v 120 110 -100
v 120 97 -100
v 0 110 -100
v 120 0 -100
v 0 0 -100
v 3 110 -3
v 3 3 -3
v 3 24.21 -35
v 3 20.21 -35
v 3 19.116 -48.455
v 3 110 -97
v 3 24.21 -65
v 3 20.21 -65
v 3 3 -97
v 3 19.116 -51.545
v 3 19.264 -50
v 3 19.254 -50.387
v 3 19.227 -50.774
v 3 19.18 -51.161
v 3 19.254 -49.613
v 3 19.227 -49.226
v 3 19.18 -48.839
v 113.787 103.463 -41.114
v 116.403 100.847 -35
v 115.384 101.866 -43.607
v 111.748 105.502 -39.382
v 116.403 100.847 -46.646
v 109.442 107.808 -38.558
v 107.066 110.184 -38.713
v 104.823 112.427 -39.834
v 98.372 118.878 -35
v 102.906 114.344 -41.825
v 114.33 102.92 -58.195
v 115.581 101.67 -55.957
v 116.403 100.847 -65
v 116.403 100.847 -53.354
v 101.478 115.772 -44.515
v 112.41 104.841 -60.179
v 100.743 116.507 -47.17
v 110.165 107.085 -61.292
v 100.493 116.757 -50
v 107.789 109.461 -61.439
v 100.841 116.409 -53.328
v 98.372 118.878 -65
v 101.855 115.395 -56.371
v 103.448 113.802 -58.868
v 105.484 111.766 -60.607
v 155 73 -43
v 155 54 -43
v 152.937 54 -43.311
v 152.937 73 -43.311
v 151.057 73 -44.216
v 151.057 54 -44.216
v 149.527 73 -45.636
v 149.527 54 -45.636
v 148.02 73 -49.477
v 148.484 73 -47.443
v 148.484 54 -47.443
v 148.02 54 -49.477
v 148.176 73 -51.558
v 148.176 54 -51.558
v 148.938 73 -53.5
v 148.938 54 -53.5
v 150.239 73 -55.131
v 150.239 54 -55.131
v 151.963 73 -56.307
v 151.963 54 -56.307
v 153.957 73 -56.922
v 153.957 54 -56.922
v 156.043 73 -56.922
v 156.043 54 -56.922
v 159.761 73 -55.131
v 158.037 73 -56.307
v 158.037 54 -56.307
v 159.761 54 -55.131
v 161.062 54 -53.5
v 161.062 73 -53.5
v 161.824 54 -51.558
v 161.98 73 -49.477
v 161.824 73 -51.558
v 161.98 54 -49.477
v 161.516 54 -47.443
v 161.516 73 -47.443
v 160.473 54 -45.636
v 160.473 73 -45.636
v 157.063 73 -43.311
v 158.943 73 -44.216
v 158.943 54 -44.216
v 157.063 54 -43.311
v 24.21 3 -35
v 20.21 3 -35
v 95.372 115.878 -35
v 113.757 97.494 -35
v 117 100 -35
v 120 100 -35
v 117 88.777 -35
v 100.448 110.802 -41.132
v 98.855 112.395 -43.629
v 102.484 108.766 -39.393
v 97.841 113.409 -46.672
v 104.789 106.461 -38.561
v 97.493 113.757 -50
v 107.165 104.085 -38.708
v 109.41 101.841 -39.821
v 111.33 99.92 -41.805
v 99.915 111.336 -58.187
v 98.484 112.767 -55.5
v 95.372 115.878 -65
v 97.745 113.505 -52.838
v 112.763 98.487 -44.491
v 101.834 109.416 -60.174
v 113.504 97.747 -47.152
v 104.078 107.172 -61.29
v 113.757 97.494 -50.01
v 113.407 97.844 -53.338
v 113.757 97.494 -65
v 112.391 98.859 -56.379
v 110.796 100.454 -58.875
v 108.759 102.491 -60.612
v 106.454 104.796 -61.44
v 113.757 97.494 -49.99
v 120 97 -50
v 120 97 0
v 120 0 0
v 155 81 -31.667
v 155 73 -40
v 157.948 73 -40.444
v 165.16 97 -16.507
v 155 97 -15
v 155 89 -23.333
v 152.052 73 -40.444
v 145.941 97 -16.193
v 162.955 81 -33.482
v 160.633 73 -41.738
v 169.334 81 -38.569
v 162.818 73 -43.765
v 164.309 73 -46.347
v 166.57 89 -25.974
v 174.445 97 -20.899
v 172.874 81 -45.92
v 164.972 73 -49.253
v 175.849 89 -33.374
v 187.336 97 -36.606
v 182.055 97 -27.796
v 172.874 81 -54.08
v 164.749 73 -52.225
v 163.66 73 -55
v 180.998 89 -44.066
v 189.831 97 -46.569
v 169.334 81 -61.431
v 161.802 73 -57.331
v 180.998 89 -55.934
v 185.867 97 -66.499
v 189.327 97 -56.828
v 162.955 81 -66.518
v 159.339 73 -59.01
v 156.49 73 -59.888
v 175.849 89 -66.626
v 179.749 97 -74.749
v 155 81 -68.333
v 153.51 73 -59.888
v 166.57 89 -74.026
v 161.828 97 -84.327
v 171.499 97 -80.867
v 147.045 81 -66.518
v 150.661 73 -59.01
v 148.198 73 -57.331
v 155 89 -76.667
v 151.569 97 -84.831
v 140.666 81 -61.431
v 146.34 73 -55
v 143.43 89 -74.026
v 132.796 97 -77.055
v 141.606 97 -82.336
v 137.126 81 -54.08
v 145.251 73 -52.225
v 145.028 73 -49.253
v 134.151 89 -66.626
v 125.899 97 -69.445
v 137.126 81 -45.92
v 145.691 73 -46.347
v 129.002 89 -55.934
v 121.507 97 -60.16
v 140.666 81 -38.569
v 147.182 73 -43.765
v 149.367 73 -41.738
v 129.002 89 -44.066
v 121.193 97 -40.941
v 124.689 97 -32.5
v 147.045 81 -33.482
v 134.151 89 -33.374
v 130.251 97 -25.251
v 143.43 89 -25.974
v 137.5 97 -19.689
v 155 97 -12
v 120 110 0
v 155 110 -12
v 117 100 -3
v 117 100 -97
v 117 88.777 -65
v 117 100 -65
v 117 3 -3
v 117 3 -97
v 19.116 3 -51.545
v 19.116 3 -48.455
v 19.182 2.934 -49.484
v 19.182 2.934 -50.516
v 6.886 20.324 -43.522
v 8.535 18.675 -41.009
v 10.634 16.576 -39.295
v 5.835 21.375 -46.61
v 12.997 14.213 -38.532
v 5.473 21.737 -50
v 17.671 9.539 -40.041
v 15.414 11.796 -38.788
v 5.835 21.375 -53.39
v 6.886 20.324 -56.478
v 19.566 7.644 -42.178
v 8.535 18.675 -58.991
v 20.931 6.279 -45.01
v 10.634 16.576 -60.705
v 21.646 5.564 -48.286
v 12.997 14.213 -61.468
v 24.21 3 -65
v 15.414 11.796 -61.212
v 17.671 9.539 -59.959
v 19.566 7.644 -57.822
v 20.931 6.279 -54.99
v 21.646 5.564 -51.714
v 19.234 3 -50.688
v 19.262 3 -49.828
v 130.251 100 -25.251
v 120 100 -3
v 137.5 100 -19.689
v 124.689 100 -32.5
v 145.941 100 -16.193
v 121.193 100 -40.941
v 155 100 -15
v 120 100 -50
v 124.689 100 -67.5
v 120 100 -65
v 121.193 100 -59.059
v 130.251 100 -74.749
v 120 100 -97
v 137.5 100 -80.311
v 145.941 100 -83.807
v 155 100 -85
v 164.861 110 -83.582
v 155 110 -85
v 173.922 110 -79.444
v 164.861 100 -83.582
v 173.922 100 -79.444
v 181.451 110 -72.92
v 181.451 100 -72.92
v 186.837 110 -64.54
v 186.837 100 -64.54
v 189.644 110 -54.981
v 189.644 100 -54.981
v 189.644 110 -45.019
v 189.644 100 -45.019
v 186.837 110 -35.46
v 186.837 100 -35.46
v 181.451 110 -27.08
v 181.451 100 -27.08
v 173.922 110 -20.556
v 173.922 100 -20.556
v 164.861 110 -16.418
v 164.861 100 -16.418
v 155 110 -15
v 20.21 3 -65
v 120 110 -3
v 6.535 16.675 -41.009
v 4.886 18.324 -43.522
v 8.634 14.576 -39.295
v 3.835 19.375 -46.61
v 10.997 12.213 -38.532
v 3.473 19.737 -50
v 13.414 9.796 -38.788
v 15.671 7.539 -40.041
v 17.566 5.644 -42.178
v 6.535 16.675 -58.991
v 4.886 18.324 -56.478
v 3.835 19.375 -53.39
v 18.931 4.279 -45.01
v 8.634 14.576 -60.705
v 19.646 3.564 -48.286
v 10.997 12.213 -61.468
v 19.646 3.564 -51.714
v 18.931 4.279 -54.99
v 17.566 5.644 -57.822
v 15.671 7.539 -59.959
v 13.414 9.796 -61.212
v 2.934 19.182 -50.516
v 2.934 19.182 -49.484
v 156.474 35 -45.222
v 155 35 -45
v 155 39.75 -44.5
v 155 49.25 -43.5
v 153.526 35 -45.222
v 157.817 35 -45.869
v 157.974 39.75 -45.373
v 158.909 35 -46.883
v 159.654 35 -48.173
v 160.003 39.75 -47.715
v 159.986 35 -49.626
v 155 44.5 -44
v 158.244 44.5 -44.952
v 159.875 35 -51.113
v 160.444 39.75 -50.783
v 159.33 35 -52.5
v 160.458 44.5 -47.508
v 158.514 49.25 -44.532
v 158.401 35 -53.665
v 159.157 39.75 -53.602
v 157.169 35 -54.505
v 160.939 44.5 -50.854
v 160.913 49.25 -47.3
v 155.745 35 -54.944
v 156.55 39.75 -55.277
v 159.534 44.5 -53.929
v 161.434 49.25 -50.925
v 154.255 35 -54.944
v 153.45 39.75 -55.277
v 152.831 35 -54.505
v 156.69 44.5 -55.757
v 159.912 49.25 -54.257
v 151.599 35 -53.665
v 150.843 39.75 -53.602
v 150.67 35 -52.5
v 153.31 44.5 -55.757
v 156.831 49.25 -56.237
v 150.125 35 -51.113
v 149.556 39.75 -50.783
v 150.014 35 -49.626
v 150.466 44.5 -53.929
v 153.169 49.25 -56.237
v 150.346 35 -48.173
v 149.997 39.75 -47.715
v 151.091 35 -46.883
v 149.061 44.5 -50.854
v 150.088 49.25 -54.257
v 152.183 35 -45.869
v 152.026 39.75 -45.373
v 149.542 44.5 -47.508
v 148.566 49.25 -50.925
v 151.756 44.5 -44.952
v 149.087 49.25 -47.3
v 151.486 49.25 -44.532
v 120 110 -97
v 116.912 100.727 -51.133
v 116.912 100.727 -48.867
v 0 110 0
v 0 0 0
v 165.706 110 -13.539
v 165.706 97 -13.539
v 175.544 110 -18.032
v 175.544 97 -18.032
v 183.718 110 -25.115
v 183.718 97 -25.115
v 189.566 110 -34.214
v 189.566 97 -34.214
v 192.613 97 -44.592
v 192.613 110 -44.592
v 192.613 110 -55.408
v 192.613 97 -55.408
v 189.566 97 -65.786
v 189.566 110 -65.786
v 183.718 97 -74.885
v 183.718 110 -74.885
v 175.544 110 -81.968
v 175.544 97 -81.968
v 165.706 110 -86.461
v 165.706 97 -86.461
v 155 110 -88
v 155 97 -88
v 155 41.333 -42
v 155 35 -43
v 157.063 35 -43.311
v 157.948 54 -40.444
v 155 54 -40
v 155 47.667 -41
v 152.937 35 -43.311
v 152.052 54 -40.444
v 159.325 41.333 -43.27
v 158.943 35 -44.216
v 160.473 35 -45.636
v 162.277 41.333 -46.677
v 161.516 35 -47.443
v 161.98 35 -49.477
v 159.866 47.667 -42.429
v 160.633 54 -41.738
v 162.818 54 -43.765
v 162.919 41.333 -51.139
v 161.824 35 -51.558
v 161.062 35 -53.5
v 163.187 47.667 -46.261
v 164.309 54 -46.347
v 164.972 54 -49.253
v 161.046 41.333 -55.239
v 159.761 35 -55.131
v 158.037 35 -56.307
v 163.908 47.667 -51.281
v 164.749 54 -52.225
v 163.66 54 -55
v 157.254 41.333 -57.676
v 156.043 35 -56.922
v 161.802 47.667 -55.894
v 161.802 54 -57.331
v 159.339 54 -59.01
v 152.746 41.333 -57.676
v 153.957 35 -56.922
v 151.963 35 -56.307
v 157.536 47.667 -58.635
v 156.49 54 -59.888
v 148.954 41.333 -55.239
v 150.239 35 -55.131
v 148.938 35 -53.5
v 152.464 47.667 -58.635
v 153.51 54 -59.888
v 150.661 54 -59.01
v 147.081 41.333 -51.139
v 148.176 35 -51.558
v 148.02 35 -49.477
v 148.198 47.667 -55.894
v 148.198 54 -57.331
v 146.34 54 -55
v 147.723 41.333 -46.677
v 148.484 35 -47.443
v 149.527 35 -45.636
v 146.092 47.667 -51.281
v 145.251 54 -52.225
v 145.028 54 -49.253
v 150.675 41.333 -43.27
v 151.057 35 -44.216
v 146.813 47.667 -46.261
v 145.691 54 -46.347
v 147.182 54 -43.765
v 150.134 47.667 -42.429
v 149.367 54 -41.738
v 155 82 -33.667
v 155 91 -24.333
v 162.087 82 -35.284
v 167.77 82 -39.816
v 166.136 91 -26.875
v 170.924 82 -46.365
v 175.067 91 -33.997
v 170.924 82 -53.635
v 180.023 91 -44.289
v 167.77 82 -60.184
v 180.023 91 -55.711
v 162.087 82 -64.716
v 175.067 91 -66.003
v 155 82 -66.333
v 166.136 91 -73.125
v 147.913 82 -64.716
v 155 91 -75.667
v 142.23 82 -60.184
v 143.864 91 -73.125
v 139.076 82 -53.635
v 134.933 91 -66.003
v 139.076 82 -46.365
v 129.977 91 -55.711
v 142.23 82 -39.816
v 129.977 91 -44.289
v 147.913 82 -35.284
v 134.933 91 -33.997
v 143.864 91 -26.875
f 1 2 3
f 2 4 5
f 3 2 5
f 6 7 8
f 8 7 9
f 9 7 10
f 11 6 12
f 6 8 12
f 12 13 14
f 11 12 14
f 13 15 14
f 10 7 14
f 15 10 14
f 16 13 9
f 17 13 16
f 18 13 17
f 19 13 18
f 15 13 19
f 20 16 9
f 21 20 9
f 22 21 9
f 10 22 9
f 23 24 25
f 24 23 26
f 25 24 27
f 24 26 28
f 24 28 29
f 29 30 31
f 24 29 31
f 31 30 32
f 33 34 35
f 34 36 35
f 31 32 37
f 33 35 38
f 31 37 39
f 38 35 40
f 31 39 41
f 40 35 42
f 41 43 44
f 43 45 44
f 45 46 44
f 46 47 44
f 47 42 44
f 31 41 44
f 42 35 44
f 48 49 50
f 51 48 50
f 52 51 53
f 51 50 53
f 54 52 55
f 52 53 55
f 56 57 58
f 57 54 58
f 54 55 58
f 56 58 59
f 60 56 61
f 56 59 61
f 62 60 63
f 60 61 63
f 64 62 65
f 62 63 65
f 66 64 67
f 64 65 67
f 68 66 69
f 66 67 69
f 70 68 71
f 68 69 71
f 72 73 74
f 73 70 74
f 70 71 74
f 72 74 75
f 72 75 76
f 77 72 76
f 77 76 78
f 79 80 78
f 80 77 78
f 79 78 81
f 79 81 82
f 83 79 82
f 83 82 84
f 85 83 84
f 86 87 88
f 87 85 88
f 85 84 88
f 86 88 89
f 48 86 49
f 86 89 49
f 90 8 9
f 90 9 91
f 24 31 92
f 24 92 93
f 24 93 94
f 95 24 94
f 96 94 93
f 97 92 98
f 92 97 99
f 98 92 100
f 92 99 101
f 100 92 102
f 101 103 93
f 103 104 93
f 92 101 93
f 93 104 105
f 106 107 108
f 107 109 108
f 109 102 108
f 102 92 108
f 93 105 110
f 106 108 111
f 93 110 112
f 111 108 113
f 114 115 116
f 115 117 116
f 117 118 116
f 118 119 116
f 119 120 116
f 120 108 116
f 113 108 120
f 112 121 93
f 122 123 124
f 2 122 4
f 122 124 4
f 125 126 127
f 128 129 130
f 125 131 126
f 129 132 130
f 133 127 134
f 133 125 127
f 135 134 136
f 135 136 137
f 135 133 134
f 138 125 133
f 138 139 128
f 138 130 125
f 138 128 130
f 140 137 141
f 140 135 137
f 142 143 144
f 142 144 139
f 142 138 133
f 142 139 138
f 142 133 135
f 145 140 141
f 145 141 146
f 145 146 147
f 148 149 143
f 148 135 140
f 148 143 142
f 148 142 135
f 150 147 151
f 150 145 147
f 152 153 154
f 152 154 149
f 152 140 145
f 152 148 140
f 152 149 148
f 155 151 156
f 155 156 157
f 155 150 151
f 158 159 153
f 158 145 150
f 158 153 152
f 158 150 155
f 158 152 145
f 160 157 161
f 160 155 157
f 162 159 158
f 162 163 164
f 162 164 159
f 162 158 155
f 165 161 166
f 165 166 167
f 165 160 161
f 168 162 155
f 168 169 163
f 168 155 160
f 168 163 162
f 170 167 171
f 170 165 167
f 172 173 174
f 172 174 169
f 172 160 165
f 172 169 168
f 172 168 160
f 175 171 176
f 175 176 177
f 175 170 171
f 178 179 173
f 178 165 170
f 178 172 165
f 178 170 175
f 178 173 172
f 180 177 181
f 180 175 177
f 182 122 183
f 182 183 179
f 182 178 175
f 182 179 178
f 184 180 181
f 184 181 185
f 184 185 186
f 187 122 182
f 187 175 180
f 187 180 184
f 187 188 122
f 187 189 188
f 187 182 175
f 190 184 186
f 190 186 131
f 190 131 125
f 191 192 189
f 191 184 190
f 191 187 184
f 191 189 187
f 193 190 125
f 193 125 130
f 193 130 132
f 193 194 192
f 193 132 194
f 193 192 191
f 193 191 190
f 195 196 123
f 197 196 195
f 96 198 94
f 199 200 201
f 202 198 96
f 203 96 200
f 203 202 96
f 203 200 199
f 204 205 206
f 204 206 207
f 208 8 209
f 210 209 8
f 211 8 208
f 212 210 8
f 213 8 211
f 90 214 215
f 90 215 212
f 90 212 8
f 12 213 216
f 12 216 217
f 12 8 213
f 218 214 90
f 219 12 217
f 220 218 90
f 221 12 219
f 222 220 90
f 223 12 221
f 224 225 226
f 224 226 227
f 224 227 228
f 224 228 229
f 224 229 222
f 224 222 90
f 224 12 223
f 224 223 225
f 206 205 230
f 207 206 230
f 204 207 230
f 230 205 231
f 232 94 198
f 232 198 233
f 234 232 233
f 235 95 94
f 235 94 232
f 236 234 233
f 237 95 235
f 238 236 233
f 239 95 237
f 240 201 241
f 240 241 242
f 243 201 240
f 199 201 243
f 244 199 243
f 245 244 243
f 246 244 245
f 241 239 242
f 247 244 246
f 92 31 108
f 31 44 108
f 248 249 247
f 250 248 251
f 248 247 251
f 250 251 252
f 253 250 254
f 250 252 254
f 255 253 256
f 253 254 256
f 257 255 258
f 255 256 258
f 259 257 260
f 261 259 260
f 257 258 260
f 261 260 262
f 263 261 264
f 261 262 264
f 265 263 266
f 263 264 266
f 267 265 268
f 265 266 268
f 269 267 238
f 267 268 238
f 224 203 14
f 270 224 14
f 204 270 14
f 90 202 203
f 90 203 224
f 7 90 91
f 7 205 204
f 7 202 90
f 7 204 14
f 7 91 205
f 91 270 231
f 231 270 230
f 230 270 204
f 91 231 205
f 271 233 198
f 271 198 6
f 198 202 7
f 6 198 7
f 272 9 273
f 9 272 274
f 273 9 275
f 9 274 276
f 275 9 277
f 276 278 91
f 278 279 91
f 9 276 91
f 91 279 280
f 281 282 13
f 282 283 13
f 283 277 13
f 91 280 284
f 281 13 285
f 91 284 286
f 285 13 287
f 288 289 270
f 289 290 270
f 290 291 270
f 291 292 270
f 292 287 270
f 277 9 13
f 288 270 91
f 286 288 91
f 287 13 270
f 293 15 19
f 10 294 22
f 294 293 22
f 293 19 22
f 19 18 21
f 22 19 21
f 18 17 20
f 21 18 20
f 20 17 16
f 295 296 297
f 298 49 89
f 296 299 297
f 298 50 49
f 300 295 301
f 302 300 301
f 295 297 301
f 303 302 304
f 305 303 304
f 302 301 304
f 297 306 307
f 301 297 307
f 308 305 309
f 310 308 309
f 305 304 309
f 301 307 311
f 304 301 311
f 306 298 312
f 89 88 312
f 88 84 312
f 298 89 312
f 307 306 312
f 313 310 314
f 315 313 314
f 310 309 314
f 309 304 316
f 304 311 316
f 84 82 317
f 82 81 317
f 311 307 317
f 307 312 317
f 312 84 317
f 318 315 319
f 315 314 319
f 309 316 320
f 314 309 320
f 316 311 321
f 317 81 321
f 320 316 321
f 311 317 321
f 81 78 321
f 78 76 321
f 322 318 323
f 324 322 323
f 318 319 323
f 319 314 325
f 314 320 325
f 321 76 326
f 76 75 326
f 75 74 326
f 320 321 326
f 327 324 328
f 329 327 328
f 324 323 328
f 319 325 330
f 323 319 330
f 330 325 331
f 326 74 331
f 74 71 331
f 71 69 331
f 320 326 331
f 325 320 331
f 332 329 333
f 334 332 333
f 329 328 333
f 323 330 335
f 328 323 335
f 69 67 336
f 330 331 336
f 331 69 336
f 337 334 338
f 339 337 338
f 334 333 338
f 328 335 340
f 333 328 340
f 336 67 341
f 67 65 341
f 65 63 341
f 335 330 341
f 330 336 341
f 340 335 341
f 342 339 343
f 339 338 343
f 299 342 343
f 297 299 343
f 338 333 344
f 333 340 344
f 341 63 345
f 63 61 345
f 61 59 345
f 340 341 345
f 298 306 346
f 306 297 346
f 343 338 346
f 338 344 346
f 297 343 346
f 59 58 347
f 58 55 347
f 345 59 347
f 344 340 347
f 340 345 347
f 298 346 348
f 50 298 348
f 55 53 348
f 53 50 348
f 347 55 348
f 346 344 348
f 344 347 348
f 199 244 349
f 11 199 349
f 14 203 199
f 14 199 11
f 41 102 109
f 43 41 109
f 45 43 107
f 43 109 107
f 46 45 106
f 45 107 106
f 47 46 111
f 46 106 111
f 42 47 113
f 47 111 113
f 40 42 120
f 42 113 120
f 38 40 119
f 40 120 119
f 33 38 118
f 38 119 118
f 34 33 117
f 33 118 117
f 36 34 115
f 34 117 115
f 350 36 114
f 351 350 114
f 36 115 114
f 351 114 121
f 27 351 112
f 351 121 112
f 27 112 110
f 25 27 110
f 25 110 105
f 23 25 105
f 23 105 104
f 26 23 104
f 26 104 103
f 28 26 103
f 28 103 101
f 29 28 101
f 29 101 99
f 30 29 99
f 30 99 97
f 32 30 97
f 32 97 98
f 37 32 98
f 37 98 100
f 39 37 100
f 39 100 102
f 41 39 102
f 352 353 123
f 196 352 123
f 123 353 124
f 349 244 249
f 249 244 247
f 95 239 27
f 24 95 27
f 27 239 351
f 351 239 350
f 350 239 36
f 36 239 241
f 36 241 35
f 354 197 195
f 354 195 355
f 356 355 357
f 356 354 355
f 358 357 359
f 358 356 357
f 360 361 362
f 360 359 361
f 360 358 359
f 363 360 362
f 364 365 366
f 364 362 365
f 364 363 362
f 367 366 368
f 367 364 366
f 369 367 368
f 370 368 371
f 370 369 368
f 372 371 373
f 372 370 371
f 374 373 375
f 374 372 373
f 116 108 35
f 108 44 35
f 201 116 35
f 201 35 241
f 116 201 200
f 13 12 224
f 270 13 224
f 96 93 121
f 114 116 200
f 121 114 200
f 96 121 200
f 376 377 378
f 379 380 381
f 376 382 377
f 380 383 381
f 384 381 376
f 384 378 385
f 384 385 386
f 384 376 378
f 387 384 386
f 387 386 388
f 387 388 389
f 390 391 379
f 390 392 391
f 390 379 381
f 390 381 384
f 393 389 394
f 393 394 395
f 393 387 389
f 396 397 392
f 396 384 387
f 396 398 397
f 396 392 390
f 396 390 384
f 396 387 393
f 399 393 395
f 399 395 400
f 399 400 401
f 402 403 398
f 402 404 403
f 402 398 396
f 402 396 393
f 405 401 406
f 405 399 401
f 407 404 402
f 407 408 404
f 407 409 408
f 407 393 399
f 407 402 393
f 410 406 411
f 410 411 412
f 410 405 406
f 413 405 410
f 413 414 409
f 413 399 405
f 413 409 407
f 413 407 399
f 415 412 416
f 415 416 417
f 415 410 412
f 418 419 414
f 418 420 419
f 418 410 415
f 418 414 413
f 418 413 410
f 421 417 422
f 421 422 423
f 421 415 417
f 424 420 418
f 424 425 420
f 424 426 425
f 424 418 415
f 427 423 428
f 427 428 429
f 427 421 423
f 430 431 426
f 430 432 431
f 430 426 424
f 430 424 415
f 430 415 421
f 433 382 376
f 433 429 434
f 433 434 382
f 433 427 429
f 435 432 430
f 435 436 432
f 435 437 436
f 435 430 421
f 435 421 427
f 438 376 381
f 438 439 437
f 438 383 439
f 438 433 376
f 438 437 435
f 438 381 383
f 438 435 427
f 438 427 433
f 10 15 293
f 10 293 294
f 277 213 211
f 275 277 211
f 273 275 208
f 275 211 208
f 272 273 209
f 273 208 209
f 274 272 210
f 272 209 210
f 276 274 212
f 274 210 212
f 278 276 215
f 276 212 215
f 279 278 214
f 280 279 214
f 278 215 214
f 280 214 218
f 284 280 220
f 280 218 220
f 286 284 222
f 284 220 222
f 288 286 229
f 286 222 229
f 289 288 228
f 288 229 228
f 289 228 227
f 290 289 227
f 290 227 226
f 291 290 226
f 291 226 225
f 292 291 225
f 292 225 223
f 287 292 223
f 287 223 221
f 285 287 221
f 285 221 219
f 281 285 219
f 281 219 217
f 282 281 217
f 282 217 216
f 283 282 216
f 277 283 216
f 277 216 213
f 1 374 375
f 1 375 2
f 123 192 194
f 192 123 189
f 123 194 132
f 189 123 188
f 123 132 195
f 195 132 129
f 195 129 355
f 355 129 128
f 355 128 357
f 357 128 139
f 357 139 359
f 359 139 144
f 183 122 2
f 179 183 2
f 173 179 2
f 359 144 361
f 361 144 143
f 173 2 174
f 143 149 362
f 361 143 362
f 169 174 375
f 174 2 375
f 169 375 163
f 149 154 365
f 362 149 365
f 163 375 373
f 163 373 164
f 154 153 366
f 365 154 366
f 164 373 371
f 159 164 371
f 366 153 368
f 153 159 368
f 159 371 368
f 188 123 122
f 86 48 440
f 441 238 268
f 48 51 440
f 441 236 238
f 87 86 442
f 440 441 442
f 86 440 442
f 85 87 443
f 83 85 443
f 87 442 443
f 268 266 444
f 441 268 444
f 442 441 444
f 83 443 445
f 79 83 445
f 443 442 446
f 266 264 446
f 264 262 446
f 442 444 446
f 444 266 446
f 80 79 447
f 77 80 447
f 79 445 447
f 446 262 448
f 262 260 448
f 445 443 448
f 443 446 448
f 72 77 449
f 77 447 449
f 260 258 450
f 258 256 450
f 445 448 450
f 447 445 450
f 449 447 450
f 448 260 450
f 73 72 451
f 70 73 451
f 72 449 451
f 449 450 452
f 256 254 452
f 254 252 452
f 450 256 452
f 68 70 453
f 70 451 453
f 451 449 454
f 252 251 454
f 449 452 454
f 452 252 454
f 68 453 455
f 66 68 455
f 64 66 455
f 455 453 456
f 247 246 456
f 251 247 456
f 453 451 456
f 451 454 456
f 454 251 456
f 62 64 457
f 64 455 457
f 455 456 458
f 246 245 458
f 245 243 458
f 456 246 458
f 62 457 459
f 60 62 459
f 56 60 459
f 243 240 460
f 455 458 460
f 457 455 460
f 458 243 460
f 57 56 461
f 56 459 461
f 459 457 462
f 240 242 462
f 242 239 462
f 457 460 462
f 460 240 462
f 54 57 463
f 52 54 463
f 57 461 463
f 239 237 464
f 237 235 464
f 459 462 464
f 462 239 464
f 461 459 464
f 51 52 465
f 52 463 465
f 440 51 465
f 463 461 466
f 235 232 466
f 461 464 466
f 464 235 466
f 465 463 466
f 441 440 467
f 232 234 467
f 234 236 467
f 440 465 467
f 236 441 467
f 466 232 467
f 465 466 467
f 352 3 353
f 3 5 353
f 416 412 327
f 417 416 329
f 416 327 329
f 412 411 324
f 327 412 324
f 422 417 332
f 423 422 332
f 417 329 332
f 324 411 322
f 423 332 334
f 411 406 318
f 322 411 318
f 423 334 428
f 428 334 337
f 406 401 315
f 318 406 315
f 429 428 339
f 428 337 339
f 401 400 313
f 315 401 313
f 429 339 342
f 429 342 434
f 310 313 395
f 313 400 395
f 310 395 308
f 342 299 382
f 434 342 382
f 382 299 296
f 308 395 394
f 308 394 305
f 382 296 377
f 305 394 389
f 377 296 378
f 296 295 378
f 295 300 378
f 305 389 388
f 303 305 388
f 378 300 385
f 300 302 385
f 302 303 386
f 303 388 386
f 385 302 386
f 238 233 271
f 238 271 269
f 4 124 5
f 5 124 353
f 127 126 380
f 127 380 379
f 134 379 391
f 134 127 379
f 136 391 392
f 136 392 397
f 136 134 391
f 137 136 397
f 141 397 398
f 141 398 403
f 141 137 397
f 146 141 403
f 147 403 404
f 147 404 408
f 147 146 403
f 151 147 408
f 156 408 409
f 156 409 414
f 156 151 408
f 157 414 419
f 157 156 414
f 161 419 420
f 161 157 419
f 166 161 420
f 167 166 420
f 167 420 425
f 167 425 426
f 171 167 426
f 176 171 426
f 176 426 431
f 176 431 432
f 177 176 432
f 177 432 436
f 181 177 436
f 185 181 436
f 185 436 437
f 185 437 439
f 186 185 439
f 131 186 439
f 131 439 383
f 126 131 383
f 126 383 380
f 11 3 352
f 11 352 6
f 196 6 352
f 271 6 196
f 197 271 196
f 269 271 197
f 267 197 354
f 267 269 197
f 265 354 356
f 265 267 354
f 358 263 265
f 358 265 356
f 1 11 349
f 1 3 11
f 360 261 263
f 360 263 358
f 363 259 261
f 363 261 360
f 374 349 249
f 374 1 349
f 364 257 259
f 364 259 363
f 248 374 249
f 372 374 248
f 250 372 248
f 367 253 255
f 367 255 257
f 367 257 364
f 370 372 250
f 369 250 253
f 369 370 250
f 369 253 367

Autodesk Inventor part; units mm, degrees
ref_plane "YZ Plane" through (0, 0, 0) normal (1, 0, 0) x (0, 1, 0)
ref_plane "XZ Plane" through (0, 0, 0) normal (0, 1, 0) x (-1, 0, 0)
ref_plane "XY Plane" through (0, 0, 0) normal (0, 0, 1) x (1, 0, 0)
sketch "Sketch1" plane through (0, 0, 0) normal (0, 1, 0) x (-1, 0, 0)
  line L0 (0, 0) -> (-120, 0)
  line L1 (-120, 0) -> (-120, -100)
  line L2 (-120, -100) -> (0, -100)
  line L3 (0, -100) -> (0, 0)
  dimension "d0" = 120
  dimension "d1" = 100
extrude "Extrusion1" add sketch "Sketch1" along normal blind 3
sketch "Sketch2" plane through (0, 3, 0) normal (0, 1, 0) x (1, 0, 0)
  line L0 (0, 100) -> (0, 0) construction
  line L1 (0, 0) -> (3, 0) construction
  line L2 (3, 0) -> (3, 3) construction
  line L3 (3, 3) -> (0, 3) construction
  line L4 (0, 3) -> (0, 0) construction
  line L5 (120, 100) -> (0, 100) construction
  line L6 (120, 100) -> (117, 100) construction
  line L7 (117, 100) -> (117, 97) construction
  line L8 (117, 97) -> (120, 97) construction
  line L9 (120, 97) -> (120, 100) construction
  line L10 (3, 3) -> (117, 3)
  line L11 (117, 3) -> (117, 97)
  line L12 (117, 97) -> (3, 97)
  line L13 (3, 97) -> (3, 3)
  line L14 (120, 0) -> (120, 100) projected
  line L15 (0, 0) -> (120, 0)
  line L16 (120, 0) -> (120, 100)
  line L17 (120, 100) -> (0, 100)
  line L18 (0, 100) -> (0, 0)
  dimension "d4" = 3
  dimension "d5" = 3
  dimension "d6" = 3
  dimension "d7" = 3
extrude "Extrusion2" add sketch "Sketch2" along normal blind 97
ref_plane "Work Plane1" through (155, 0, 0) normal (1, 0, 0) x (0, 0, -1)
sketch "Sketch3" plane through (155, 0, 0) normal (1, 0, 0) x (0, 0, -1)
  line L0 (0, 0) -> (0, 100) construction
  line L1 (0, 0) -> (50, 0) construction
  line L2 (100, 0) -> (0, 0) construction
  line L3 (50, 0) -> (50, 35) construction
  line L4 (50, 35) -> (43, 35) construction
  line L5 (50, 35) -> (50, 73) construction
  line L6 (50, 73) -> (40, 73) construction
  line L7 (40, 73) -> (40, 54) construction
  line L8 (43, 35) -> (40, 54)
  line L9 (40, 54) -> (40, 73)
  line L10 (3, 100) -> (97, 100) construction
  line L11 (50, 100) -> (15, 100) construction
  line L12 (15, 100) -> (15, 97)
  line L13 (15, 97) -> (40, 73)
  line L14 (15, 100) -> (43, 73)
  line L15 (43, 73) -> (43, 54)
  line L16 (43, 35) -> (45, 35)
  line L17 (43, 54) -> (45, 35)
  dimension "d11" = 35
  dimension "d12" = 7
  dimension "d13" = 38
  dimension "d14" = 10
  dimension "d15" = 35
  dimension "d16" = 3
  dimension "d81" = 19
  dimension "d82" = 3
  dimension "d83" = 2
  dimension "d84" = 19
revolve "Revolution1" add sketch "Sketch3" angle 360 about axis through (155, 35, -50) along (0, 1, 0)
sketch "Sketch4" plane through (0, 100, 0) normal (0, 1, 0) x (1, 0, 0)
  line L0 (120, 0) -> (120, 100) projected
  line L1 (120, 0) -> (120, 3)
  line L2 (120, 100) -> (0, 100) projected
  line L3 (120, 100) -> (120, 97)
  line L4 (120, 97) -> (120, 3)
  circle A0 centre (155, 50) radius 5 projected
  circle A1 centre (155, 50) radius 35
  circle A2 centre (155, 50) radius 38
  line L5 (120, 0) -> (120, 100) projected
  line L6 (120, 0) -> (155, 12)
  line L7 (155, 88) -> (120, 100)
  point P0 (0, 0)
  point P1 (120, 50)
  dimension "d18" = 3
  dimension "d19" = 3
  dimension "d89" = 70
  dimension "d90" = 3
extrude "Extrusion3" add sketch "Sketch4" against normal blind 3 contours L0 A2 L6 | A2 L0 | L0 L7 A2 picked at (191.3899, 55.4147)
sketch "Sketch5" plane through (0, 100, 0) normal (0, 1, 0) x (1, 0, 0)
  line L0 (120, 0) -> (120, 100) projected
  line L1 (0, 100) -> (0, 0) projected
  line L2 (120, 0) -> (0, 0)
  line L3 (0, 0) -> (0, 100)
  line L4 (0, 100) -> (120, 100)
  line L5 (120, 100) -> (120, 0)
  circle A0 centre (155, 50) radius 35 projected
  line L6 (117, 3) -> (117, 97) projected
  line L7 (117, 3) -> (3, 3) projected
  line L8 (3, 3) -> (3, 97) projected
  line L9 (117, 3) -> (3, 3)
  line L10 (3, 3) -> (3, 97)
  line L11 (3, 97) -> (117, 97)
  line L12 (117, 97) -> (117, 3)
  circle A1 centre (155, 50) radius 35
  circle A2 centre (155, 50) radius 38
  line L13 (0, 0) -> (120, 0) projected
  line L14 (120, 100) -> (155, 88) projected
  line L15 (120, 100) -> (155, 88)
  line L16 (155, 12) -> (120, 0) projected
  line L17 (120, 0) -> (155, 12)
  line L18 (120, 50) -> (120, 0) projected
  line L19 (120, 3) -> (155, 15)
  line L20 (120, 100) -> (120, 50) projected
  line L21 (120, 97) -> (155, 85)
  line L22 (155, 88) -> (120, 100) projected
  line L23 (117, 3) -> (120, 3)
  line L24 (120, 97) -> (117, 97)
  dimension "d85" = 3
  dimension "d91" = 37
  dimension "d92" = 37
extrude "Extrusion4" add sketch "Sketch5" along normal blind 10 contours L2 L1 L4 L0 L24 L11 L8 L7 L23 | L0 L19 A2 L16 | A2 L19 A0 L21 | L14 A2 L21 L0
ref_plane "Work Plane2" through (3, 3, -65) normal (0, 0, 1) x (1, 0, 0)
sketch "Sketch6" plane through (3, 3, -65) normal (0, 0, 1) x (1, 0, 0)
  line L0 (0, 0) -> (0, 107) projected
  line L1 (0, 0) -> (0, 21.21)
  line L2 (0, 0) -> (114, 0) projected
  line L3 (0, 0) -> (21.21, 0)
  line L4 (114, 0) -> (0, 0) projected
  line L5 (0, 21.21) -> (21.21, 0)
  line L6 (0, 21.21) -> (0, 17.21)
  line L7 (0, 17.21) -> (17.21, 0)
  point P0 (-3, -3)
  point P1 (0, 17.21)
  point P2 (17.21, 0)
  point P3 (21.21, 0)
  point P4 (0, 97)
  dimension "d26" = 21.21
  dimension "d27" = 21.21
  dimension "d28" = 4
extrude "Extrusion5" add sketch "Sketch6" along normal blind 30 contours L0 L5 L2 L7
sketch "Sketch7" plane through (3, 24.21, -65) normal (0.7071, 0.7071, 0) x (-0.7071, 0.7071, 0)
  line L0 (-29.9955, 30) -> (0, 30) projected
  line L1 (-14.9977, 30) -> (-14.9977, 15)
  circle A0 centre (-14.9977, 15) radius 11.5
  point P0 (-14.9977, 65)
  dimension "d31" = 15
  dimension "d32" = 23
extrude "Extrusion6" cut sketch "Sketch7" against normal blind 3.6
sketch "Sketch11" plane through (3, 3, -65) normal (0, 0, 1) x (1, 0, 0)
  line L0 (18.7367, 2.4733) -> (16.7367, 0.4733) construction
  line L1 (18.7367, 2.4733) -> (148.7367, 132.4733) construction
  line L2 (2.4733, 18.7367) -> (0.4733, 16.7367) construction
  line L3 (2.4733, 18.7367) -> (132.4733, 148.7367) construction
  line L4 (113.7569, 97.4935) -> (95.3721, 115.8782) construction
  line L5 (95.3721, 115.8782) -> (92.3721, 112.8782) construction
  line L6 (92.3721, 112.8782) -> (113.7569, 91.4935) construction
  line L7 (117, 97) -> (145, 70) projected
  line L8 (117, 97) -> (113.4034, 97.847)
  line L9 (113.4034, 97.847) -> (95.3721, 115.8782)
  line L10 (95.3721, 115.8782) -> (92.3721, 112.8782)
  line L11 (92.3721, 112.8782) -> (110.7569, 94.4935)
  line L12 (110.7569, 94.4935) -> (114, 85.7766)
  line L13 (114, 0) -> (114, 97) projected
  line L14 (114, 85.7766) -> (117, 85.7766)
  line L15 (117, 85.7766) -> (117, 97)
  line L16 (117, 94) -> (117, 107) projected
  point P0 (-3, -3)
  dimension "d65" = 130
  dimension "d66" = 130
  dimension "d67" = 26
  dimension "d68" = 3
  dimension "d69" = 134.3788
  dimension "d70" = 4.2426
  dimension "d71" = 49.4689
  dimension "d72" = 49.4689
  dimension "d73" = 25.634
  dimension "d74" = 149.293
  dimension "d75" = 0
extrude "Extrusion8" add sketch "Sketch11" along normal blind 30
sketch "Sketch12" plane through (3, 24.21, -65) normal (0.7071, 0.7071, 0) x (-0.7071, 0.7071, 0)
  line L0 (-14.9977, -32) -> (-14.9977, 62) projected
  circle A0 centre (-14.9977, 15) radius 11.5
  point P0 (-14.9977, 65)
  dimension "d78" = 23
extrude "Extrusion9" cut sketch "Sketch12" along normal through all
properties part number "Resoar V2"
